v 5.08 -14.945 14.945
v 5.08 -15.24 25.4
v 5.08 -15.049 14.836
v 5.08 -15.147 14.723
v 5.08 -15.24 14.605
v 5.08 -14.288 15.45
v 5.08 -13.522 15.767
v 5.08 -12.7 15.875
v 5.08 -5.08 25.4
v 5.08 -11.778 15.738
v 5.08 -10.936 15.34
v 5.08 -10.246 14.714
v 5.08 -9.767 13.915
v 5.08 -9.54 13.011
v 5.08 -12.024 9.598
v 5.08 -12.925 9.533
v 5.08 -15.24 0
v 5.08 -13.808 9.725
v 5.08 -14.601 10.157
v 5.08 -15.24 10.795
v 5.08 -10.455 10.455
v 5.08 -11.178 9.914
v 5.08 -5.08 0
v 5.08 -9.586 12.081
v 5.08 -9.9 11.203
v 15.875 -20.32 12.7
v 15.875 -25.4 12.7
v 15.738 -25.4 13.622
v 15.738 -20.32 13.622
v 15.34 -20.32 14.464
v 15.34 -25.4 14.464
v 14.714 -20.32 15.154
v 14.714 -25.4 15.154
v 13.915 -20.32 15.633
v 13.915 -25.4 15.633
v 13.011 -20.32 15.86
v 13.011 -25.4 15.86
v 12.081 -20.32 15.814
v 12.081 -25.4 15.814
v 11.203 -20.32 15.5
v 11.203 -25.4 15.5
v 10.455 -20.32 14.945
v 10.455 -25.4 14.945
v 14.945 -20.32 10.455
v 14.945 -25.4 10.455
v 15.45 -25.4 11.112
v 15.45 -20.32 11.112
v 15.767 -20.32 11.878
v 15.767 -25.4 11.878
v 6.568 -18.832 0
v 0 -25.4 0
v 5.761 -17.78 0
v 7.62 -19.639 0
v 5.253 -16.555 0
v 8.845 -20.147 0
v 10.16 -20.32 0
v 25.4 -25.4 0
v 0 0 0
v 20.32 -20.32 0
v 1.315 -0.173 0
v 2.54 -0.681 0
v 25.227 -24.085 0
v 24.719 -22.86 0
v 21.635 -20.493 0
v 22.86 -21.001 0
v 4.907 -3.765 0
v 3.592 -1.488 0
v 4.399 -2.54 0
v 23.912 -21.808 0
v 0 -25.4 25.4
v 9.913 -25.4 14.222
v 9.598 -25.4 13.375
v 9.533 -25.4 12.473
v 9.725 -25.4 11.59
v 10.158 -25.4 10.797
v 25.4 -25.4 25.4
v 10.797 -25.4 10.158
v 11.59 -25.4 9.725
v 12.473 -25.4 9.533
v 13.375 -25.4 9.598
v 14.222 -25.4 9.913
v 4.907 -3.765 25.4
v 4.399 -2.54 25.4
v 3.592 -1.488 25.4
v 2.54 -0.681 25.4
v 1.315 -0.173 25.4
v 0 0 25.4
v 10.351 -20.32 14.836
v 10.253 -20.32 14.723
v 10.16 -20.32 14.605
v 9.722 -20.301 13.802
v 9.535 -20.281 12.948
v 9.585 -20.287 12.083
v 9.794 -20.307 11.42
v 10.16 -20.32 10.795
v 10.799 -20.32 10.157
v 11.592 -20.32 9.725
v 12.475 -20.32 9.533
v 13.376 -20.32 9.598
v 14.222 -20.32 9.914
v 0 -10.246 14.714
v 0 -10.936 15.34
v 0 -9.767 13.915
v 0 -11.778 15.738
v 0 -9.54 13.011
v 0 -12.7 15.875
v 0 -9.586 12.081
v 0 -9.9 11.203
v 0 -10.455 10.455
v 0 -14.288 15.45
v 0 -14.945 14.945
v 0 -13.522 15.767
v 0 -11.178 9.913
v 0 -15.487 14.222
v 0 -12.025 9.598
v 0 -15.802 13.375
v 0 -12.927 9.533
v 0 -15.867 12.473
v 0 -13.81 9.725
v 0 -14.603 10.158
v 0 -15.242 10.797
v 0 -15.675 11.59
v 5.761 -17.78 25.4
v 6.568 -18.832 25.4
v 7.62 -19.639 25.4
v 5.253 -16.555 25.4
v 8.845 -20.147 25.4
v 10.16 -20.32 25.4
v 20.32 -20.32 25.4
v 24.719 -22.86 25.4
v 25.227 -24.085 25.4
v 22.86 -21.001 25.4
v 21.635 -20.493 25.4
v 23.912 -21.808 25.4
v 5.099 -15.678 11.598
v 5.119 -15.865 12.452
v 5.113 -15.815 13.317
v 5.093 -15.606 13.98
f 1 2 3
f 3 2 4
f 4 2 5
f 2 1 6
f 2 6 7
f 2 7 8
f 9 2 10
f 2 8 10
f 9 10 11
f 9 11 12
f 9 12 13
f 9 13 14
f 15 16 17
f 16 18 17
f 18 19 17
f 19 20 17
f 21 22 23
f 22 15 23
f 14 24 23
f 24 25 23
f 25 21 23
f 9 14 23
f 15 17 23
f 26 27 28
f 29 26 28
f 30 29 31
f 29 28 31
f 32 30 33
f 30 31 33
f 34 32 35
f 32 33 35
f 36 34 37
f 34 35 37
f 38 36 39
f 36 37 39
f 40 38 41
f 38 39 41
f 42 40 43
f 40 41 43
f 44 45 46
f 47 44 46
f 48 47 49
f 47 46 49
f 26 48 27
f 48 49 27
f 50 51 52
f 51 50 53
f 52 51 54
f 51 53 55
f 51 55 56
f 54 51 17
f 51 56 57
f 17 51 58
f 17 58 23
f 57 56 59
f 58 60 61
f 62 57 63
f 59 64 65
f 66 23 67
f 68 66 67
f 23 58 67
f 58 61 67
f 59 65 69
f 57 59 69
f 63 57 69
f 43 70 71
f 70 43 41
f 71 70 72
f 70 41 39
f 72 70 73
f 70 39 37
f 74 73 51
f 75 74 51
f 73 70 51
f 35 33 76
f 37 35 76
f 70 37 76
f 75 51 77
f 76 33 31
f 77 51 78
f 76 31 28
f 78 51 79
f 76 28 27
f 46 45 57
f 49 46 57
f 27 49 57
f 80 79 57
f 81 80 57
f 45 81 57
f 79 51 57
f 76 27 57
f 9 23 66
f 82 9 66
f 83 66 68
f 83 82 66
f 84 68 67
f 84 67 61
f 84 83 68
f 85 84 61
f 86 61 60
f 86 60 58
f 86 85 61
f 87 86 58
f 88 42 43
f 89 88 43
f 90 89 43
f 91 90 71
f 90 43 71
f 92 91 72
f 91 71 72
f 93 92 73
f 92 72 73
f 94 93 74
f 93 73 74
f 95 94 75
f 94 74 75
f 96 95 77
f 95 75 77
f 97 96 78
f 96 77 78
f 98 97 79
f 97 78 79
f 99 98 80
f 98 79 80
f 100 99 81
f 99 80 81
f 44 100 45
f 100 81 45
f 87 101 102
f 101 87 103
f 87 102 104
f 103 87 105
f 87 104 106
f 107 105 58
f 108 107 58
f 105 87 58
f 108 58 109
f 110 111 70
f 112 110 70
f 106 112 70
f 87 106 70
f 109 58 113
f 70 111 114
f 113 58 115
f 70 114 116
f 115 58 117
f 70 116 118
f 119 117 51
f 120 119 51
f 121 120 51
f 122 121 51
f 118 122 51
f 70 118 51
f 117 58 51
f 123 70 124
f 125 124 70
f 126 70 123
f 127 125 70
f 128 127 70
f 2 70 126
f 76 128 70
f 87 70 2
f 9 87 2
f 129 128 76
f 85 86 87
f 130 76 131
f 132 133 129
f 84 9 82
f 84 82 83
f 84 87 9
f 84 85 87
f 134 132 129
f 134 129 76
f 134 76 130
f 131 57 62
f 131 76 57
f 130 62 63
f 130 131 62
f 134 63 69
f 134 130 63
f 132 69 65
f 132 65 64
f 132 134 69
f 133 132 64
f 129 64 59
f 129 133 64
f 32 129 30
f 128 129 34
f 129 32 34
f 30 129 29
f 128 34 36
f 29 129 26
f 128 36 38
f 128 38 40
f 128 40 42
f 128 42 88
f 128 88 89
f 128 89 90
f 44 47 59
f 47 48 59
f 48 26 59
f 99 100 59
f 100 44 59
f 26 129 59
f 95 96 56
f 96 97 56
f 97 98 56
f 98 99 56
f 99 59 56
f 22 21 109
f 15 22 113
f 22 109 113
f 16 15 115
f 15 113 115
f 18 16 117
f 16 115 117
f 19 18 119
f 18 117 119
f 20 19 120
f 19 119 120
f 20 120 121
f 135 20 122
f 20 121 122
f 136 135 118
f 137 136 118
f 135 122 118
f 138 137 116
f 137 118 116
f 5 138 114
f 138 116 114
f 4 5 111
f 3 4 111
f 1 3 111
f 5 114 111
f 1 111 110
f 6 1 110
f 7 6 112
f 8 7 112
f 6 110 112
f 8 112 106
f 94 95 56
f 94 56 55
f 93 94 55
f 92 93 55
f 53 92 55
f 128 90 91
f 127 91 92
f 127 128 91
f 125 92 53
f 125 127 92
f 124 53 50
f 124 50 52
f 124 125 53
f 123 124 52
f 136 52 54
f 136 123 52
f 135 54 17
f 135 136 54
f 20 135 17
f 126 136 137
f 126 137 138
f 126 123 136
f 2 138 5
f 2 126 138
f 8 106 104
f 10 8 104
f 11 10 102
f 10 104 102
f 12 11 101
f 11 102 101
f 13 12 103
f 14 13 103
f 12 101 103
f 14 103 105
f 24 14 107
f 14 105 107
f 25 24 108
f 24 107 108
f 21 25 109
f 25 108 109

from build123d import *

# Parameters (mm, degrees)
BOSS_EXTRUDE1_DEPTH = 25.4
FILLET1_R           = 5.08
CUT_EXTRUDE1_DEPTH  = 25.4
CUT_EXTRUDE2_DEPTH  = 25.4


with BuildPart() as part:
    # Sketch1 → Boss-Extrude1 (new body)
    with BuildSketch(Plane.XY):
        Polygon((0, 0), (0, -25.4), (25.4, -25.4), (25.4, -20.32), (5.08, -20.32), (5.08, 0), align=None)
    extrude(amount=BOSS_EXTRUDE1_DEPTH)

    # Fillet1
    fillet1_edges = [part.edges().sort_by_distance(p)[0] for p in [
        (5.08, -20.32, 12.7),
        (5.08, 0, 12.7),
        (25.4, -20.32, 12.7),
    ]]
    fillet(fillet1_edges, radius=FILLET1_R - 0.0001)  # a hair under: the kernel refuses the full size

    # Sketch2 → Cut-Extrude1 (cut)
    with BuildSketch(Plane.XZ.offset(25.4)):
        with BuildLine():
            ThreePointArc((15.875, 12.7), (13.915019898, 15.633317516), (10.45493597, 14.94506403))
            Line((10.45493597, 14.94506403), (14.94506403, 10.45493597))
            ThreePointArc((14.94506403, 10.45493597), (15.633317516, 11.484980102), (15.875, 12.7))
        make_face()
        with BuildLine():
            Line((14.94506403, 10.45493597), (10.45493597, 14.94506403))
            ThreePointArc((10.45493597, 14.94506403), (10.45493597, 10.45493597), (14.94506403, 10.45493597))
        make_face()
    extrude(amount=-CUT_EXTRUDE1_DEPTH, mode=Mode.SUBTRACT)

    # Sketch3 → Cut-Extrude2 (cut)
    with BuildSketch(Plane.ZY):
        with BuildLine():
            ThreePointArc((10.45493597, -10.45493597), (10.45493597, -14.94506403), (14.94506403, -14.94506403))
            Line((14.94506403, -14.94506403), (10.45493597, -10.45493597))
        make_face()
        with BuildLine():
            Line((10.45493597, -10.45493597), (14.94506403, -14.94506403))
            ThreePointArc((14.94506403, -14.94506403), (15.633317516, -13.915019898), (15.875, -12.7))
            ThreePointArc((15.875, -12.7), (13.915019898, -9.766682484), (10.45493597, -10.45493597))
        make_face()
    extrude(amount=-CUT_EXTRUDE2_DEPTH, mode=Mode.SUBTRACT)


solid = part.part
